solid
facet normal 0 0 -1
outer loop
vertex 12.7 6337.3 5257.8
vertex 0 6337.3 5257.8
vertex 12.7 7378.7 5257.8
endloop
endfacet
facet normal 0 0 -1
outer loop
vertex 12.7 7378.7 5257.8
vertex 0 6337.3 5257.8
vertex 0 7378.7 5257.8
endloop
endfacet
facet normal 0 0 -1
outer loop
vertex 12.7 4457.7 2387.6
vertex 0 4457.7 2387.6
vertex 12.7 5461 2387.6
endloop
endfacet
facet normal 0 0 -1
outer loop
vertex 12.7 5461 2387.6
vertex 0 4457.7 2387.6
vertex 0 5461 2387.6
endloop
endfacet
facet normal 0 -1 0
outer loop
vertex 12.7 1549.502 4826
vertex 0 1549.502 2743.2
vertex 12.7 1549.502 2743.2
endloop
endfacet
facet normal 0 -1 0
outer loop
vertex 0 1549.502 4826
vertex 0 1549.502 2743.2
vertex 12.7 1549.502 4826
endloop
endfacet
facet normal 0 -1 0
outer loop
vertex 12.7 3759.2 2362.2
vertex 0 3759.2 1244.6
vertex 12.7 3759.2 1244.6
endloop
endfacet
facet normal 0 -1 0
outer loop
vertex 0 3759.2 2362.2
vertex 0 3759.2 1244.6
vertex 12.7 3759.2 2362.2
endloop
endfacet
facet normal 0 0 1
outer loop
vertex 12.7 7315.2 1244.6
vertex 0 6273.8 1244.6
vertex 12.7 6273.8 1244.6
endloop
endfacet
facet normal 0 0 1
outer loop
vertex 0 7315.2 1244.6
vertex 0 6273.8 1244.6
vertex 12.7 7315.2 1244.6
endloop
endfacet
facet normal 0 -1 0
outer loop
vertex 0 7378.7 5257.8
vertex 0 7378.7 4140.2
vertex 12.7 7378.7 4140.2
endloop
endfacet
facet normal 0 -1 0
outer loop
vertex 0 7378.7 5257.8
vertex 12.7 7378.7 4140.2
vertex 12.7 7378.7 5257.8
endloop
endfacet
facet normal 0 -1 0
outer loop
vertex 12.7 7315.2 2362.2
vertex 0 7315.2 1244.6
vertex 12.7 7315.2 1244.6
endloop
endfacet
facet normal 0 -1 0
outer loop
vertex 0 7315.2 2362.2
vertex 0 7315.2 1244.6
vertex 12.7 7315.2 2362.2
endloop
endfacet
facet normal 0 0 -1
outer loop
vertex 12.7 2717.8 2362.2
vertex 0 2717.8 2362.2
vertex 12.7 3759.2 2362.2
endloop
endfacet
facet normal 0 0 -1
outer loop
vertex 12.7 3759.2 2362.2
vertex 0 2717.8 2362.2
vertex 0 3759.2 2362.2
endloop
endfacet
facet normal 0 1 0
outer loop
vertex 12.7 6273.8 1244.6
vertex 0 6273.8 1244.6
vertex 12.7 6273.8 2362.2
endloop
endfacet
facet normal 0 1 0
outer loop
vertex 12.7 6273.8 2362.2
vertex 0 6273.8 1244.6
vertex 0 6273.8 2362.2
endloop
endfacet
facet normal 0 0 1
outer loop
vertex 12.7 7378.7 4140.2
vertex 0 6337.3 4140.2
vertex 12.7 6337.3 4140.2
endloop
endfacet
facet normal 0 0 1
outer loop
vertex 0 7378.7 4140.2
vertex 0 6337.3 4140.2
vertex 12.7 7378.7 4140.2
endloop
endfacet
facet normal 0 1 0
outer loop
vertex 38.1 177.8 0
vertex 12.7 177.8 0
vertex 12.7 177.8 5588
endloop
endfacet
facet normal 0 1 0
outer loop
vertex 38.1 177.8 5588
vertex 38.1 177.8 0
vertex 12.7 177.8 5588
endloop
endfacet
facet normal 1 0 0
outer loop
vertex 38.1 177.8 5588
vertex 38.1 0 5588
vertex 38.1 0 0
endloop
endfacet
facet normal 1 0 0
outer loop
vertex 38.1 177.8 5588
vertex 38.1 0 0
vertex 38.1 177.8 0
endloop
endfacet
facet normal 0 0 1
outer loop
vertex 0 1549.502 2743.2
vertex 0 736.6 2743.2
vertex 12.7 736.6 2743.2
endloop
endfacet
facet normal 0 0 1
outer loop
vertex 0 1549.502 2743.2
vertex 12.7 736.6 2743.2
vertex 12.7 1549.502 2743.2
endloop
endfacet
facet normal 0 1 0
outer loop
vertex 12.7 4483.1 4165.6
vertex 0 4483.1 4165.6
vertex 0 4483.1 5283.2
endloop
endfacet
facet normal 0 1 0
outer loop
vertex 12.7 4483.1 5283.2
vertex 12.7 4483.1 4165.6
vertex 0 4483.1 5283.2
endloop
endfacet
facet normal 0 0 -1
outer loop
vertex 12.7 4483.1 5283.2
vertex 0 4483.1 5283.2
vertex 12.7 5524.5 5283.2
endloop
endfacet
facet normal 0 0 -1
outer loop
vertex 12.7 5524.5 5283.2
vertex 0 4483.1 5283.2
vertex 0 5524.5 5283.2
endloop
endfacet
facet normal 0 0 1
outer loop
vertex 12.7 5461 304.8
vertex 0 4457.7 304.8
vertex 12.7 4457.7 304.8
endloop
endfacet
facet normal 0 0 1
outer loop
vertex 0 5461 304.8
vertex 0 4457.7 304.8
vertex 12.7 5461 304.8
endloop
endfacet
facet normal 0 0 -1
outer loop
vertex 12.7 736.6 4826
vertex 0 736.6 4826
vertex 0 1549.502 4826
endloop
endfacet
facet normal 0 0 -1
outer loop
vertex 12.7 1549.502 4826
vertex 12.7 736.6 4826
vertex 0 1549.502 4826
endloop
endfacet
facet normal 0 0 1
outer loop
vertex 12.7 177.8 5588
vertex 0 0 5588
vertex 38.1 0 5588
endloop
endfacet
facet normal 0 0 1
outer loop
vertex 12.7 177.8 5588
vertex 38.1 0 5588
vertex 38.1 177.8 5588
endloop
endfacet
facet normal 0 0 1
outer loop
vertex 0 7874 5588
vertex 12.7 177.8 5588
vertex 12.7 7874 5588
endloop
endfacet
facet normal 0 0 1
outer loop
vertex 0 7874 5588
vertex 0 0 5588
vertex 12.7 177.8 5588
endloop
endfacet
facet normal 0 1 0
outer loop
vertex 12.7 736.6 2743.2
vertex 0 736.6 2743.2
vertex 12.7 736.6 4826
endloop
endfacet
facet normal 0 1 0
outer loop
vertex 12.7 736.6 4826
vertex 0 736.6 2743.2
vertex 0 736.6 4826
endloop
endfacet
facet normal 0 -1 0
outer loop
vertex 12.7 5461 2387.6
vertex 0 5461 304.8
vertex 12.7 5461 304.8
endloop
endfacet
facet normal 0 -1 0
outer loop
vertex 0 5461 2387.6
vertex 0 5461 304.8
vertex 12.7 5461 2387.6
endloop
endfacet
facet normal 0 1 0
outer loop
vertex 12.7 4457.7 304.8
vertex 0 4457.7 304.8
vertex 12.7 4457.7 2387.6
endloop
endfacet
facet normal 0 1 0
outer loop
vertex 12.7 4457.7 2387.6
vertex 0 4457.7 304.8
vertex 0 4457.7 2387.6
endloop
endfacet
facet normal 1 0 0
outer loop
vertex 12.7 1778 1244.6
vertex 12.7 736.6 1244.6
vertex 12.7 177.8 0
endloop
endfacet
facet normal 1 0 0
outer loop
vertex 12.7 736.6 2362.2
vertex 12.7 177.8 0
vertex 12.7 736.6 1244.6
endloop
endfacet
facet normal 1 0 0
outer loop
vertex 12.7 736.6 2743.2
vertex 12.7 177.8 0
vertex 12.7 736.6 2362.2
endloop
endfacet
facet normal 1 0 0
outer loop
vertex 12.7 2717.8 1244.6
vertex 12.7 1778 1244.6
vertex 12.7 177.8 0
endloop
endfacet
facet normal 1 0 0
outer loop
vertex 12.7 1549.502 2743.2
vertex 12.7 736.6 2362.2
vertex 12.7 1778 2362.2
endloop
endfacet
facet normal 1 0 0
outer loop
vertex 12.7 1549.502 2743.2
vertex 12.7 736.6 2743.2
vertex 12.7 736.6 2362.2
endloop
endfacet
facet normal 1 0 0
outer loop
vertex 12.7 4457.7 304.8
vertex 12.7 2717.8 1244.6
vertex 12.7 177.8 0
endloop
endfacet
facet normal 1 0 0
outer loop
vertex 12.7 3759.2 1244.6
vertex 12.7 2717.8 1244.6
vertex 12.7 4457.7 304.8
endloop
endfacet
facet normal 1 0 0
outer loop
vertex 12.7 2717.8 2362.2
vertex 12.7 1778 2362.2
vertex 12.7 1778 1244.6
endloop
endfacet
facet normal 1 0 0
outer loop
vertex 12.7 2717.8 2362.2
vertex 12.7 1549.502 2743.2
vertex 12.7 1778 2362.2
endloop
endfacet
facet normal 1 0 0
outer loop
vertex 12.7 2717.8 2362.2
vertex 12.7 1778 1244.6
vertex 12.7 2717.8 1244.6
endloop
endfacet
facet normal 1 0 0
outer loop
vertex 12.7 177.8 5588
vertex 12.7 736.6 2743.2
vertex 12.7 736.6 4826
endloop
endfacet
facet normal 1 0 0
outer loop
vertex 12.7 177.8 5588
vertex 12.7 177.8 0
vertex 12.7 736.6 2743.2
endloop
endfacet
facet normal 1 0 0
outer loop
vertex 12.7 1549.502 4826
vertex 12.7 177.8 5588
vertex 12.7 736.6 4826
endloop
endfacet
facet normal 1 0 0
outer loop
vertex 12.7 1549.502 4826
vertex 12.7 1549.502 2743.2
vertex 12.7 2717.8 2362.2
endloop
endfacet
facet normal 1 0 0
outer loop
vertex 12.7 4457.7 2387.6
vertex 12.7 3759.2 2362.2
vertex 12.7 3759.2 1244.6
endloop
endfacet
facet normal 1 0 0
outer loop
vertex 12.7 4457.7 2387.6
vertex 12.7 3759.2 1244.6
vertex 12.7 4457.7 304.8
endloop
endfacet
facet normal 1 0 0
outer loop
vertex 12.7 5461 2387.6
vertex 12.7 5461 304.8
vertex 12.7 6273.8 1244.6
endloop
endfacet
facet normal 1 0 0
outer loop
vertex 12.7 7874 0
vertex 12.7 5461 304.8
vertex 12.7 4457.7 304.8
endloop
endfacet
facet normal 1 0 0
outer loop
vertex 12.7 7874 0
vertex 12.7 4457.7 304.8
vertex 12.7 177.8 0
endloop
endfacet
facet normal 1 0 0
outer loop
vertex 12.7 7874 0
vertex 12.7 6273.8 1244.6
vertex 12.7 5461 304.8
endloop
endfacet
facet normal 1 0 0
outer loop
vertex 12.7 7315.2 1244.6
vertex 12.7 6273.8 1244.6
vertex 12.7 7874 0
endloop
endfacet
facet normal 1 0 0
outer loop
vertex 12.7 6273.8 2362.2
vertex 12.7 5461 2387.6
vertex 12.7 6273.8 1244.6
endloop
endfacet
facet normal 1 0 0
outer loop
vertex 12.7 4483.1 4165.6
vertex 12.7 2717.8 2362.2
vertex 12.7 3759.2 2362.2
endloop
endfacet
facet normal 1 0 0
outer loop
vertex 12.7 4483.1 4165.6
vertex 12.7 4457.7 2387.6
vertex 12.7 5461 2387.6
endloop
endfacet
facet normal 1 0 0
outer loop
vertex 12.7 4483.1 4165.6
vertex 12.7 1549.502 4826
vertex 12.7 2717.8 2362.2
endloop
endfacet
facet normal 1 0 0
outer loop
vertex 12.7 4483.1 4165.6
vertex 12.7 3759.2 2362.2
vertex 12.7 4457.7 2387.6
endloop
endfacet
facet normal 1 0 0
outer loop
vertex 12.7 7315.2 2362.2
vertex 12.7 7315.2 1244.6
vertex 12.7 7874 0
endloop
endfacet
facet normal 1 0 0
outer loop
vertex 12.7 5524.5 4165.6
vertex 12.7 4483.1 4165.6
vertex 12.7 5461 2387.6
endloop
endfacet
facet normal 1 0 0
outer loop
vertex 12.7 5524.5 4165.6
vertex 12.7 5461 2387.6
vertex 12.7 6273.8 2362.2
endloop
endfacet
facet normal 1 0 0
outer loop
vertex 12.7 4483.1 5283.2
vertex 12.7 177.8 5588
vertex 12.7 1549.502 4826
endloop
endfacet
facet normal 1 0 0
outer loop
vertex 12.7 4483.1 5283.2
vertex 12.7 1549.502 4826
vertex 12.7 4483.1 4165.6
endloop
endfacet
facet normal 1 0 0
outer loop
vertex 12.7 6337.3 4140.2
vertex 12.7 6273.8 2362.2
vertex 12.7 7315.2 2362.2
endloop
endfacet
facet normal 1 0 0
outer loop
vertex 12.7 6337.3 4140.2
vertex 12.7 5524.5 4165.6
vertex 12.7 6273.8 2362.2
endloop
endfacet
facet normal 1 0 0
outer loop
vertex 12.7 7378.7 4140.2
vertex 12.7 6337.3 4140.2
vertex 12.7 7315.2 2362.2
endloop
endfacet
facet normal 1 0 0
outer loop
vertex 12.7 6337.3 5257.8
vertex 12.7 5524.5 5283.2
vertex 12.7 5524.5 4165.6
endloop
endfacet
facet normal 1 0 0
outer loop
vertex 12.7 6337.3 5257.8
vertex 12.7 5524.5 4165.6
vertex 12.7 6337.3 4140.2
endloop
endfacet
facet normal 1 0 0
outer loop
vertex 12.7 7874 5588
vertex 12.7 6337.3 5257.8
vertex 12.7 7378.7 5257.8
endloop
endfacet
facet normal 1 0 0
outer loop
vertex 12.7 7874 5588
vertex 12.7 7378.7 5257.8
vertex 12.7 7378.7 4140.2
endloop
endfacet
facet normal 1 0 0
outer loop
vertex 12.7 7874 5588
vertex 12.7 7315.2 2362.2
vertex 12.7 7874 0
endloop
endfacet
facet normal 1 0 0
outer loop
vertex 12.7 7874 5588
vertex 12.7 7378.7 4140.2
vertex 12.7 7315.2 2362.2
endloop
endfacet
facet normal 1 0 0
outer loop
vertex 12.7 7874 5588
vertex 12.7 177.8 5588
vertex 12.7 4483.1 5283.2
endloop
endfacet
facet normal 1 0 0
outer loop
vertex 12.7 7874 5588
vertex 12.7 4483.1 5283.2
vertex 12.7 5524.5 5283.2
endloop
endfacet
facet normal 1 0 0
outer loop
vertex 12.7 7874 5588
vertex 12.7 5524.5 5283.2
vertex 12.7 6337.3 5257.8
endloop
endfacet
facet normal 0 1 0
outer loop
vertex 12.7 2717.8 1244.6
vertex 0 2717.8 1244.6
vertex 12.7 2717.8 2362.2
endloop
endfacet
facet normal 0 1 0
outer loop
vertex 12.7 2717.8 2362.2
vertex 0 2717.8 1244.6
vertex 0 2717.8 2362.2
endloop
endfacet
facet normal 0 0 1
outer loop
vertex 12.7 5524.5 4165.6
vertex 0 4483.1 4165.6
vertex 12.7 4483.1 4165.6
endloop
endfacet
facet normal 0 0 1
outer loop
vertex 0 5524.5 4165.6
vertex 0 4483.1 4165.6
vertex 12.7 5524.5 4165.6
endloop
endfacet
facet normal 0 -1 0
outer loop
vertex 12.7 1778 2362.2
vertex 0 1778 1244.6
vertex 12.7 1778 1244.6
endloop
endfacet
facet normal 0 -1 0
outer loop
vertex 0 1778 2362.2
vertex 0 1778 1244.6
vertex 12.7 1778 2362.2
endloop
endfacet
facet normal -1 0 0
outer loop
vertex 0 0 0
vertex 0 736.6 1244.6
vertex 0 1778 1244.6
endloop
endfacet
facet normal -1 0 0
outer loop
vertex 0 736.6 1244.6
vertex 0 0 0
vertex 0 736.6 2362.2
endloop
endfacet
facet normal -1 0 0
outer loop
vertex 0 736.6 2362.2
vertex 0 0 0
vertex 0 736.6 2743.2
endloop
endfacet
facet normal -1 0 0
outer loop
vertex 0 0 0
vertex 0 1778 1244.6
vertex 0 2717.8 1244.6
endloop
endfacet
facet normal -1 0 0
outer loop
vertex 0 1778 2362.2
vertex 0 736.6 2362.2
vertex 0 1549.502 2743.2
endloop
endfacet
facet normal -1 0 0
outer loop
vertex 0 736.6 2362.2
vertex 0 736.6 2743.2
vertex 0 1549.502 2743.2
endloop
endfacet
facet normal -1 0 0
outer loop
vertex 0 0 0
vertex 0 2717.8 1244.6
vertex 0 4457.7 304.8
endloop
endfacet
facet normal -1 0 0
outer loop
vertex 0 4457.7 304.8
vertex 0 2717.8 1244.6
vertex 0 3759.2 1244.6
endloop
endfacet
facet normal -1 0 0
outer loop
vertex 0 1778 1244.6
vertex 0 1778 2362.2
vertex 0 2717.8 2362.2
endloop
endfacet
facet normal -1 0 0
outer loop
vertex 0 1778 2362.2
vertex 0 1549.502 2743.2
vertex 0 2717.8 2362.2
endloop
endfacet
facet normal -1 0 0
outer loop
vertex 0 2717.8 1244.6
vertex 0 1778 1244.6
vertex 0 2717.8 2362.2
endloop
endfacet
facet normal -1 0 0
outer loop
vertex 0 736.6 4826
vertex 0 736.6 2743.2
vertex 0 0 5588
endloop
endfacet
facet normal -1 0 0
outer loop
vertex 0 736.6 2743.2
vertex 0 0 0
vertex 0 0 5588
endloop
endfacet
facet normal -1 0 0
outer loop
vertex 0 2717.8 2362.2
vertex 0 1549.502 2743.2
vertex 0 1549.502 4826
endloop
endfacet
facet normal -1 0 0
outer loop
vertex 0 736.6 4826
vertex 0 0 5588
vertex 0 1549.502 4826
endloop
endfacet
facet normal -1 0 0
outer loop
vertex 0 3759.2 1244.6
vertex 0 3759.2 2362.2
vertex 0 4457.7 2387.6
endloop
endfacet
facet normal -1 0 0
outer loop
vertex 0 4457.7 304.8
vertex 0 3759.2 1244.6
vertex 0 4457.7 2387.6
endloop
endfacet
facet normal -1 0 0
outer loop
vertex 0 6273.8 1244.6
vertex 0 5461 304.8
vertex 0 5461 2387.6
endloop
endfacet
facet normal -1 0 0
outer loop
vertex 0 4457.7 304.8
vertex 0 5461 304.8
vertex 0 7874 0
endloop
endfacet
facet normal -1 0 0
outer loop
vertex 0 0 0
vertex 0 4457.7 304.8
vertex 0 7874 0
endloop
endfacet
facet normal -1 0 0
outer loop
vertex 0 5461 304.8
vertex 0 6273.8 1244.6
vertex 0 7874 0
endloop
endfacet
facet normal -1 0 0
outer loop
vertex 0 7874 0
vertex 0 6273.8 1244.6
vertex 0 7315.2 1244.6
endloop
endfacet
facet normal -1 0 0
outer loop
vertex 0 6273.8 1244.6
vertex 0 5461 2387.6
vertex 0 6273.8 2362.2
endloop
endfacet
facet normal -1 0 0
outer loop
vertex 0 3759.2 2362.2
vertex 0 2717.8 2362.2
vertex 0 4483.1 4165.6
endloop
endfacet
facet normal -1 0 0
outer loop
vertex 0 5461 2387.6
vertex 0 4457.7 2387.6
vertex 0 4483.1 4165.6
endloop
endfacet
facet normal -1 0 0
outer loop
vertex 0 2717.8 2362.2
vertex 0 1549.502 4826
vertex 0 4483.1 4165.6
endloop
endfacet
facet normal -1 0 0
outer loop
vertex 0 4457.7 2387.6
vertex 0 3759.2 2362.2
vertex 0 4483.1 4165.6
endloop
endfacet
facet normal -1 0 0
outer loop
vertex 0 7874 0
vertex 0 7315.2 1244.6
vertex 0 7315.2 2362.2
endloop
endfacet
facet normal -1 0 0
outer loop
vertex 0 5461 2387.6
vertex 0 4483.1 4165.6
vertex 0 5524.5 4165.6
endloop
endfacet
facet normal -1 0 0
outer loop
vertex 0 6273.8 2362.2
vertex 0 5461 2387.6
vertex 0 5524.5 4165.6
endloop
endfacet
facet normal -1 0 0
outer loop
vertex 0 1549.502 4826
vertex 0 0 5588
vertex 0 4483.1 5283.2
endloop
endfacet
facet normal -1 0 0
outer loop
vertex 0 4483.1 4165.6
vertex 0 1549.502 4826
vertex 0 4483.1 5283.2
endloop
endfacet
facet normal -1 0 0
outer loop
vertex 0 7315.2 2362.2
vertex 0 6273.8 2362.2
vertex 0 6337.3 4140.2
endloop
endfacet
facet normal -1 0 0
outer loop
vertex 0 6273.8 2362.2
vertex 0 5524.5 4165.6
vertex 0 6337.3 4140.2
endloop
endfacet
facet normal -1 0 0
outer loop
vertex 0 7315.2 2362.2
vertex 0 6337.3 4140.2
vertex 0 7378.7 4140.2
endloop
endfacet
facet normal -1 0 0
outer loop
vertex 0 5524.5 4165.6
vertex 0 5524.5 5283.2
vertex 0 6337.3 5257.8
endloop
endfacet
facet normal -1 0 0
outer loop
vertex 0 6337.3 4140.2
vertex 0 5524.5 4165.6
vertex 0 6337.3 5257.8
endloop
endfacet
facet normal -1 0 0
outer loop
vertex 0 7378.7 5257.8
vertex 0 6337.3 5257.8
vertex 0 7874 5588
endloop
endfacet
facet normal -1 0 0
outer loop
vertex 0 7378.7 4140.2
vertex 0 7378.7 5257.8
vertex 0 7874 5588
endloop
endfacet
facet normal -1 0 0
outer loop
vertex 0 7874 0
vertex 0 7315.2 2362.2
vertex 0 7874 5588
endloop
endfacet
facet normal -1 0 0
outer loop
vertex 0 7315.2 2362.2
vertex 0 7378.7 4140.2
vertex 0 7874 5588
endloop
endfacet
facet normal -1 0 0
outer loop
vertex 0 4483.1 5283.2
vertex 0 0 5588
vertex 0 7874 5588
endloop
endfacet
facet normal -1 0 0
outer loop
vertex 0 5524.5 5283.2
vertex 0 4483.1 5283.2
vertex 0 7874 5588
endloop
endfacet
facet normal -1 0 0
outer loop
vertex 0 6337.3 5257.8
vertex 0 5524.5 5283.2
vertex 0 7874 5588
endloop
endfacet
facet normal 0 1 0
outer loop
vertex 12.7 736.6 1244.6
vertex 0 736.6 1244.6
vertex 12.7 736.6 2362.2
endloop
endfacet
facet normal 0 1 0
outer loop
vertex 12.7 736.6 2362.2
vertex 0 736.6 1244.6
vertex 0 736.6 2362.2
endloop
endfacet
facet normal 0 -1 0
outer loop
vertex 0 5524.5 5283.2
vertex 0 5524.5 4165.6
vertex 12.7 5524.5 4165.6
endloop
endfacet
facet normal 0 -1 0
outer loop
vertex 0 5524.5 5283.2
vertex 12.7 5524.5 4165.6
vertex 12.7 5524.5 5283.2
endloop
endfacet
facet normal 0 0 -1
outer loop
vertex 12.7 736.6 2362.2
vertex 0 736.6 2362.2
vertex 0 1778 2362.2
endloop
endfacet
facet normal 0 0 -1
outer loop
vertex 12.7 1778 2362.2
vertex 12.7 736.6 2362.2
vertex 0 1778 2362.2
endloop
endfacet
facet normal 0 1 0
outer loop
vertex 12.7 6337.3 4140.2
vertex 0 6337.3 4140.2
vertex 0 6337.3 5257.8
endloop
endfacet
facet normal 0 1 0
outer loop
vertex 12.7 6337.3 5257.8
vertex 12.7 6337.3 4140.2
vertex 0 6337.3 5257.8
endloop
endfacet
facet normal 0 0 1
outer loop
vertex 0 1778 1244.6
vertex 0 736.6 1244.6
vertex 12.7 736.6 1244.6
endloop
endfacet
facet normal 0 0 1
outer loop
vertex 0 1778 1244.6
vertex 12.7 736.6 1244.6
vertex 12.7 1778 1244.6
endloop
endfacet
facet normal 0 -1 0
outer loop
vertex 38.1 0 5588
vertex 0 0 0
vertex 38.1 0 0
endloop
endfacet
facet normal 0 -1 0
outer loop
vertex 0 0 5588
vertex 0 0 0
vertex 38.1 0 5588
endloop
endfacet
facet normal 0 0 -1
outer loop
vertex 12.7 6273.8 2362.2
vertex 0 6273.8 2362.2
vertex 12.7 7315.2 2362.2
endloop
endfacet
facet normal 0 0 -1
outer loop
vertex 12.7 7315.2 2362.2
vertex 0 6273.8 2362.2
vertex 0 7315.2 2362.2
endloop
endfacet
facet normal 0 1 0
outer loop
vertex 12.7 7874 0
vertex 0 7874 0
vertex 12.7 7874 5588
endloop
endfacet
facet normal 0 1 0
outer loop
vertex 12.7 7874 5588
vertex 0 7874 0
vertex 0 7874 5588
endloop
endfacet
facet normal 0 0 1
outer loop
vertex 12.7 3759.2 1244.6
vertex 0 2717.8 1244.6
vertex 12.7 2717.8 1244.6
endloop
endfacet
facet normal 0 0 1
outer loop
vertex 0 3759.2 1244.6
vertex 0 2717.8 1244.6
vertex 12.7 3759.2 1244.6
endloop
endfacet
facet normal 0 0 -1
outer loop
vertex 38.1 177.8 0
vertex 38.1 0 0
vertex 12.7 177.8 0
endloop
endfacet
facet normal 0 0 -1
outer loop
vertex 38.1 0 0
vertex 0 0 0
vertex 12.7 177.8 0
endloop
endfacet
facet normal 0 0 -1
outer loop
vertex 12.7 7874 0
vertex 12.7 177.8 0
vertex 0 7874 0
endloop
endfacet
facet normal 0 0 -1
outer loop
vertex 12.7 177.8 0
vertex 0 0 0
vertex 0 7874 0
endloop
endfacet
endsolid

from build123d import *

# Parameters (mm, degrees)
F0_W     = 7874
F0_H     = 5588
F0_W_2   = 1041.4
F0_H_2   = 1117.6
F0_W_3   = 1003.3
F0_H_3   = 2082.8
F0_W_4   = 812.9016
F1_DEPTH = 12.7
F2_W     = 177.8
F2_H     = 5588
F3_DEPTH = 25.4


with BuildPart() as f1:
    # F0 (on Right) → F1 (new body)
    with BuildSketch(Plane.YZ):
        with Locations((3937, 2794)):
            Rectangle(F0_W, F0_H)
        with Locations((1257.3, 1803.4)):
            Rectangle(F0_W_2, F0_H_2, mode=Mode.SUBTRACT)
        with Locations((3238.5, 1803.4)):
            Rectangle(F0_W_2, F0_H_2, mode=Mode.SUBTRACT)
        with Locations((4959.35, 1346.2)):
            Rectangle(F0_W_3, F0_H_3, mode=Mode.SUBTRACT)
        with Locations((6794.5, 1803.4)):
            Rectangle(F0_W_2, F0_H_2, mode=Mode.SUBTRACT)
        with Locations((1143.0508, 3784.6)):
            Rectangle(F0_W_4, F0_H_3, mode=Mode.SUBTRACT)
        with Locations((5003.8, 4724.4)):
            Rectangle(F0_W_2, F0_H_2, mode=Mode.SUBTRACT)
        with Locations((6858, 4699)):
            Rectangle(F0_W_2, F0_H_2, mode=Mode.SUBTRACT)
    extrude(amount=F1_DEPTH)

    # F2 (on face) → F3 (join)
    with BuildSketch(Plane.YZ.offset(12.7)):
        with Locations((88.9, 2794)):
            Rectangle(F2_W, F2_H)
    extrude(amount=F3_DEPTH)


solid = f1.part
